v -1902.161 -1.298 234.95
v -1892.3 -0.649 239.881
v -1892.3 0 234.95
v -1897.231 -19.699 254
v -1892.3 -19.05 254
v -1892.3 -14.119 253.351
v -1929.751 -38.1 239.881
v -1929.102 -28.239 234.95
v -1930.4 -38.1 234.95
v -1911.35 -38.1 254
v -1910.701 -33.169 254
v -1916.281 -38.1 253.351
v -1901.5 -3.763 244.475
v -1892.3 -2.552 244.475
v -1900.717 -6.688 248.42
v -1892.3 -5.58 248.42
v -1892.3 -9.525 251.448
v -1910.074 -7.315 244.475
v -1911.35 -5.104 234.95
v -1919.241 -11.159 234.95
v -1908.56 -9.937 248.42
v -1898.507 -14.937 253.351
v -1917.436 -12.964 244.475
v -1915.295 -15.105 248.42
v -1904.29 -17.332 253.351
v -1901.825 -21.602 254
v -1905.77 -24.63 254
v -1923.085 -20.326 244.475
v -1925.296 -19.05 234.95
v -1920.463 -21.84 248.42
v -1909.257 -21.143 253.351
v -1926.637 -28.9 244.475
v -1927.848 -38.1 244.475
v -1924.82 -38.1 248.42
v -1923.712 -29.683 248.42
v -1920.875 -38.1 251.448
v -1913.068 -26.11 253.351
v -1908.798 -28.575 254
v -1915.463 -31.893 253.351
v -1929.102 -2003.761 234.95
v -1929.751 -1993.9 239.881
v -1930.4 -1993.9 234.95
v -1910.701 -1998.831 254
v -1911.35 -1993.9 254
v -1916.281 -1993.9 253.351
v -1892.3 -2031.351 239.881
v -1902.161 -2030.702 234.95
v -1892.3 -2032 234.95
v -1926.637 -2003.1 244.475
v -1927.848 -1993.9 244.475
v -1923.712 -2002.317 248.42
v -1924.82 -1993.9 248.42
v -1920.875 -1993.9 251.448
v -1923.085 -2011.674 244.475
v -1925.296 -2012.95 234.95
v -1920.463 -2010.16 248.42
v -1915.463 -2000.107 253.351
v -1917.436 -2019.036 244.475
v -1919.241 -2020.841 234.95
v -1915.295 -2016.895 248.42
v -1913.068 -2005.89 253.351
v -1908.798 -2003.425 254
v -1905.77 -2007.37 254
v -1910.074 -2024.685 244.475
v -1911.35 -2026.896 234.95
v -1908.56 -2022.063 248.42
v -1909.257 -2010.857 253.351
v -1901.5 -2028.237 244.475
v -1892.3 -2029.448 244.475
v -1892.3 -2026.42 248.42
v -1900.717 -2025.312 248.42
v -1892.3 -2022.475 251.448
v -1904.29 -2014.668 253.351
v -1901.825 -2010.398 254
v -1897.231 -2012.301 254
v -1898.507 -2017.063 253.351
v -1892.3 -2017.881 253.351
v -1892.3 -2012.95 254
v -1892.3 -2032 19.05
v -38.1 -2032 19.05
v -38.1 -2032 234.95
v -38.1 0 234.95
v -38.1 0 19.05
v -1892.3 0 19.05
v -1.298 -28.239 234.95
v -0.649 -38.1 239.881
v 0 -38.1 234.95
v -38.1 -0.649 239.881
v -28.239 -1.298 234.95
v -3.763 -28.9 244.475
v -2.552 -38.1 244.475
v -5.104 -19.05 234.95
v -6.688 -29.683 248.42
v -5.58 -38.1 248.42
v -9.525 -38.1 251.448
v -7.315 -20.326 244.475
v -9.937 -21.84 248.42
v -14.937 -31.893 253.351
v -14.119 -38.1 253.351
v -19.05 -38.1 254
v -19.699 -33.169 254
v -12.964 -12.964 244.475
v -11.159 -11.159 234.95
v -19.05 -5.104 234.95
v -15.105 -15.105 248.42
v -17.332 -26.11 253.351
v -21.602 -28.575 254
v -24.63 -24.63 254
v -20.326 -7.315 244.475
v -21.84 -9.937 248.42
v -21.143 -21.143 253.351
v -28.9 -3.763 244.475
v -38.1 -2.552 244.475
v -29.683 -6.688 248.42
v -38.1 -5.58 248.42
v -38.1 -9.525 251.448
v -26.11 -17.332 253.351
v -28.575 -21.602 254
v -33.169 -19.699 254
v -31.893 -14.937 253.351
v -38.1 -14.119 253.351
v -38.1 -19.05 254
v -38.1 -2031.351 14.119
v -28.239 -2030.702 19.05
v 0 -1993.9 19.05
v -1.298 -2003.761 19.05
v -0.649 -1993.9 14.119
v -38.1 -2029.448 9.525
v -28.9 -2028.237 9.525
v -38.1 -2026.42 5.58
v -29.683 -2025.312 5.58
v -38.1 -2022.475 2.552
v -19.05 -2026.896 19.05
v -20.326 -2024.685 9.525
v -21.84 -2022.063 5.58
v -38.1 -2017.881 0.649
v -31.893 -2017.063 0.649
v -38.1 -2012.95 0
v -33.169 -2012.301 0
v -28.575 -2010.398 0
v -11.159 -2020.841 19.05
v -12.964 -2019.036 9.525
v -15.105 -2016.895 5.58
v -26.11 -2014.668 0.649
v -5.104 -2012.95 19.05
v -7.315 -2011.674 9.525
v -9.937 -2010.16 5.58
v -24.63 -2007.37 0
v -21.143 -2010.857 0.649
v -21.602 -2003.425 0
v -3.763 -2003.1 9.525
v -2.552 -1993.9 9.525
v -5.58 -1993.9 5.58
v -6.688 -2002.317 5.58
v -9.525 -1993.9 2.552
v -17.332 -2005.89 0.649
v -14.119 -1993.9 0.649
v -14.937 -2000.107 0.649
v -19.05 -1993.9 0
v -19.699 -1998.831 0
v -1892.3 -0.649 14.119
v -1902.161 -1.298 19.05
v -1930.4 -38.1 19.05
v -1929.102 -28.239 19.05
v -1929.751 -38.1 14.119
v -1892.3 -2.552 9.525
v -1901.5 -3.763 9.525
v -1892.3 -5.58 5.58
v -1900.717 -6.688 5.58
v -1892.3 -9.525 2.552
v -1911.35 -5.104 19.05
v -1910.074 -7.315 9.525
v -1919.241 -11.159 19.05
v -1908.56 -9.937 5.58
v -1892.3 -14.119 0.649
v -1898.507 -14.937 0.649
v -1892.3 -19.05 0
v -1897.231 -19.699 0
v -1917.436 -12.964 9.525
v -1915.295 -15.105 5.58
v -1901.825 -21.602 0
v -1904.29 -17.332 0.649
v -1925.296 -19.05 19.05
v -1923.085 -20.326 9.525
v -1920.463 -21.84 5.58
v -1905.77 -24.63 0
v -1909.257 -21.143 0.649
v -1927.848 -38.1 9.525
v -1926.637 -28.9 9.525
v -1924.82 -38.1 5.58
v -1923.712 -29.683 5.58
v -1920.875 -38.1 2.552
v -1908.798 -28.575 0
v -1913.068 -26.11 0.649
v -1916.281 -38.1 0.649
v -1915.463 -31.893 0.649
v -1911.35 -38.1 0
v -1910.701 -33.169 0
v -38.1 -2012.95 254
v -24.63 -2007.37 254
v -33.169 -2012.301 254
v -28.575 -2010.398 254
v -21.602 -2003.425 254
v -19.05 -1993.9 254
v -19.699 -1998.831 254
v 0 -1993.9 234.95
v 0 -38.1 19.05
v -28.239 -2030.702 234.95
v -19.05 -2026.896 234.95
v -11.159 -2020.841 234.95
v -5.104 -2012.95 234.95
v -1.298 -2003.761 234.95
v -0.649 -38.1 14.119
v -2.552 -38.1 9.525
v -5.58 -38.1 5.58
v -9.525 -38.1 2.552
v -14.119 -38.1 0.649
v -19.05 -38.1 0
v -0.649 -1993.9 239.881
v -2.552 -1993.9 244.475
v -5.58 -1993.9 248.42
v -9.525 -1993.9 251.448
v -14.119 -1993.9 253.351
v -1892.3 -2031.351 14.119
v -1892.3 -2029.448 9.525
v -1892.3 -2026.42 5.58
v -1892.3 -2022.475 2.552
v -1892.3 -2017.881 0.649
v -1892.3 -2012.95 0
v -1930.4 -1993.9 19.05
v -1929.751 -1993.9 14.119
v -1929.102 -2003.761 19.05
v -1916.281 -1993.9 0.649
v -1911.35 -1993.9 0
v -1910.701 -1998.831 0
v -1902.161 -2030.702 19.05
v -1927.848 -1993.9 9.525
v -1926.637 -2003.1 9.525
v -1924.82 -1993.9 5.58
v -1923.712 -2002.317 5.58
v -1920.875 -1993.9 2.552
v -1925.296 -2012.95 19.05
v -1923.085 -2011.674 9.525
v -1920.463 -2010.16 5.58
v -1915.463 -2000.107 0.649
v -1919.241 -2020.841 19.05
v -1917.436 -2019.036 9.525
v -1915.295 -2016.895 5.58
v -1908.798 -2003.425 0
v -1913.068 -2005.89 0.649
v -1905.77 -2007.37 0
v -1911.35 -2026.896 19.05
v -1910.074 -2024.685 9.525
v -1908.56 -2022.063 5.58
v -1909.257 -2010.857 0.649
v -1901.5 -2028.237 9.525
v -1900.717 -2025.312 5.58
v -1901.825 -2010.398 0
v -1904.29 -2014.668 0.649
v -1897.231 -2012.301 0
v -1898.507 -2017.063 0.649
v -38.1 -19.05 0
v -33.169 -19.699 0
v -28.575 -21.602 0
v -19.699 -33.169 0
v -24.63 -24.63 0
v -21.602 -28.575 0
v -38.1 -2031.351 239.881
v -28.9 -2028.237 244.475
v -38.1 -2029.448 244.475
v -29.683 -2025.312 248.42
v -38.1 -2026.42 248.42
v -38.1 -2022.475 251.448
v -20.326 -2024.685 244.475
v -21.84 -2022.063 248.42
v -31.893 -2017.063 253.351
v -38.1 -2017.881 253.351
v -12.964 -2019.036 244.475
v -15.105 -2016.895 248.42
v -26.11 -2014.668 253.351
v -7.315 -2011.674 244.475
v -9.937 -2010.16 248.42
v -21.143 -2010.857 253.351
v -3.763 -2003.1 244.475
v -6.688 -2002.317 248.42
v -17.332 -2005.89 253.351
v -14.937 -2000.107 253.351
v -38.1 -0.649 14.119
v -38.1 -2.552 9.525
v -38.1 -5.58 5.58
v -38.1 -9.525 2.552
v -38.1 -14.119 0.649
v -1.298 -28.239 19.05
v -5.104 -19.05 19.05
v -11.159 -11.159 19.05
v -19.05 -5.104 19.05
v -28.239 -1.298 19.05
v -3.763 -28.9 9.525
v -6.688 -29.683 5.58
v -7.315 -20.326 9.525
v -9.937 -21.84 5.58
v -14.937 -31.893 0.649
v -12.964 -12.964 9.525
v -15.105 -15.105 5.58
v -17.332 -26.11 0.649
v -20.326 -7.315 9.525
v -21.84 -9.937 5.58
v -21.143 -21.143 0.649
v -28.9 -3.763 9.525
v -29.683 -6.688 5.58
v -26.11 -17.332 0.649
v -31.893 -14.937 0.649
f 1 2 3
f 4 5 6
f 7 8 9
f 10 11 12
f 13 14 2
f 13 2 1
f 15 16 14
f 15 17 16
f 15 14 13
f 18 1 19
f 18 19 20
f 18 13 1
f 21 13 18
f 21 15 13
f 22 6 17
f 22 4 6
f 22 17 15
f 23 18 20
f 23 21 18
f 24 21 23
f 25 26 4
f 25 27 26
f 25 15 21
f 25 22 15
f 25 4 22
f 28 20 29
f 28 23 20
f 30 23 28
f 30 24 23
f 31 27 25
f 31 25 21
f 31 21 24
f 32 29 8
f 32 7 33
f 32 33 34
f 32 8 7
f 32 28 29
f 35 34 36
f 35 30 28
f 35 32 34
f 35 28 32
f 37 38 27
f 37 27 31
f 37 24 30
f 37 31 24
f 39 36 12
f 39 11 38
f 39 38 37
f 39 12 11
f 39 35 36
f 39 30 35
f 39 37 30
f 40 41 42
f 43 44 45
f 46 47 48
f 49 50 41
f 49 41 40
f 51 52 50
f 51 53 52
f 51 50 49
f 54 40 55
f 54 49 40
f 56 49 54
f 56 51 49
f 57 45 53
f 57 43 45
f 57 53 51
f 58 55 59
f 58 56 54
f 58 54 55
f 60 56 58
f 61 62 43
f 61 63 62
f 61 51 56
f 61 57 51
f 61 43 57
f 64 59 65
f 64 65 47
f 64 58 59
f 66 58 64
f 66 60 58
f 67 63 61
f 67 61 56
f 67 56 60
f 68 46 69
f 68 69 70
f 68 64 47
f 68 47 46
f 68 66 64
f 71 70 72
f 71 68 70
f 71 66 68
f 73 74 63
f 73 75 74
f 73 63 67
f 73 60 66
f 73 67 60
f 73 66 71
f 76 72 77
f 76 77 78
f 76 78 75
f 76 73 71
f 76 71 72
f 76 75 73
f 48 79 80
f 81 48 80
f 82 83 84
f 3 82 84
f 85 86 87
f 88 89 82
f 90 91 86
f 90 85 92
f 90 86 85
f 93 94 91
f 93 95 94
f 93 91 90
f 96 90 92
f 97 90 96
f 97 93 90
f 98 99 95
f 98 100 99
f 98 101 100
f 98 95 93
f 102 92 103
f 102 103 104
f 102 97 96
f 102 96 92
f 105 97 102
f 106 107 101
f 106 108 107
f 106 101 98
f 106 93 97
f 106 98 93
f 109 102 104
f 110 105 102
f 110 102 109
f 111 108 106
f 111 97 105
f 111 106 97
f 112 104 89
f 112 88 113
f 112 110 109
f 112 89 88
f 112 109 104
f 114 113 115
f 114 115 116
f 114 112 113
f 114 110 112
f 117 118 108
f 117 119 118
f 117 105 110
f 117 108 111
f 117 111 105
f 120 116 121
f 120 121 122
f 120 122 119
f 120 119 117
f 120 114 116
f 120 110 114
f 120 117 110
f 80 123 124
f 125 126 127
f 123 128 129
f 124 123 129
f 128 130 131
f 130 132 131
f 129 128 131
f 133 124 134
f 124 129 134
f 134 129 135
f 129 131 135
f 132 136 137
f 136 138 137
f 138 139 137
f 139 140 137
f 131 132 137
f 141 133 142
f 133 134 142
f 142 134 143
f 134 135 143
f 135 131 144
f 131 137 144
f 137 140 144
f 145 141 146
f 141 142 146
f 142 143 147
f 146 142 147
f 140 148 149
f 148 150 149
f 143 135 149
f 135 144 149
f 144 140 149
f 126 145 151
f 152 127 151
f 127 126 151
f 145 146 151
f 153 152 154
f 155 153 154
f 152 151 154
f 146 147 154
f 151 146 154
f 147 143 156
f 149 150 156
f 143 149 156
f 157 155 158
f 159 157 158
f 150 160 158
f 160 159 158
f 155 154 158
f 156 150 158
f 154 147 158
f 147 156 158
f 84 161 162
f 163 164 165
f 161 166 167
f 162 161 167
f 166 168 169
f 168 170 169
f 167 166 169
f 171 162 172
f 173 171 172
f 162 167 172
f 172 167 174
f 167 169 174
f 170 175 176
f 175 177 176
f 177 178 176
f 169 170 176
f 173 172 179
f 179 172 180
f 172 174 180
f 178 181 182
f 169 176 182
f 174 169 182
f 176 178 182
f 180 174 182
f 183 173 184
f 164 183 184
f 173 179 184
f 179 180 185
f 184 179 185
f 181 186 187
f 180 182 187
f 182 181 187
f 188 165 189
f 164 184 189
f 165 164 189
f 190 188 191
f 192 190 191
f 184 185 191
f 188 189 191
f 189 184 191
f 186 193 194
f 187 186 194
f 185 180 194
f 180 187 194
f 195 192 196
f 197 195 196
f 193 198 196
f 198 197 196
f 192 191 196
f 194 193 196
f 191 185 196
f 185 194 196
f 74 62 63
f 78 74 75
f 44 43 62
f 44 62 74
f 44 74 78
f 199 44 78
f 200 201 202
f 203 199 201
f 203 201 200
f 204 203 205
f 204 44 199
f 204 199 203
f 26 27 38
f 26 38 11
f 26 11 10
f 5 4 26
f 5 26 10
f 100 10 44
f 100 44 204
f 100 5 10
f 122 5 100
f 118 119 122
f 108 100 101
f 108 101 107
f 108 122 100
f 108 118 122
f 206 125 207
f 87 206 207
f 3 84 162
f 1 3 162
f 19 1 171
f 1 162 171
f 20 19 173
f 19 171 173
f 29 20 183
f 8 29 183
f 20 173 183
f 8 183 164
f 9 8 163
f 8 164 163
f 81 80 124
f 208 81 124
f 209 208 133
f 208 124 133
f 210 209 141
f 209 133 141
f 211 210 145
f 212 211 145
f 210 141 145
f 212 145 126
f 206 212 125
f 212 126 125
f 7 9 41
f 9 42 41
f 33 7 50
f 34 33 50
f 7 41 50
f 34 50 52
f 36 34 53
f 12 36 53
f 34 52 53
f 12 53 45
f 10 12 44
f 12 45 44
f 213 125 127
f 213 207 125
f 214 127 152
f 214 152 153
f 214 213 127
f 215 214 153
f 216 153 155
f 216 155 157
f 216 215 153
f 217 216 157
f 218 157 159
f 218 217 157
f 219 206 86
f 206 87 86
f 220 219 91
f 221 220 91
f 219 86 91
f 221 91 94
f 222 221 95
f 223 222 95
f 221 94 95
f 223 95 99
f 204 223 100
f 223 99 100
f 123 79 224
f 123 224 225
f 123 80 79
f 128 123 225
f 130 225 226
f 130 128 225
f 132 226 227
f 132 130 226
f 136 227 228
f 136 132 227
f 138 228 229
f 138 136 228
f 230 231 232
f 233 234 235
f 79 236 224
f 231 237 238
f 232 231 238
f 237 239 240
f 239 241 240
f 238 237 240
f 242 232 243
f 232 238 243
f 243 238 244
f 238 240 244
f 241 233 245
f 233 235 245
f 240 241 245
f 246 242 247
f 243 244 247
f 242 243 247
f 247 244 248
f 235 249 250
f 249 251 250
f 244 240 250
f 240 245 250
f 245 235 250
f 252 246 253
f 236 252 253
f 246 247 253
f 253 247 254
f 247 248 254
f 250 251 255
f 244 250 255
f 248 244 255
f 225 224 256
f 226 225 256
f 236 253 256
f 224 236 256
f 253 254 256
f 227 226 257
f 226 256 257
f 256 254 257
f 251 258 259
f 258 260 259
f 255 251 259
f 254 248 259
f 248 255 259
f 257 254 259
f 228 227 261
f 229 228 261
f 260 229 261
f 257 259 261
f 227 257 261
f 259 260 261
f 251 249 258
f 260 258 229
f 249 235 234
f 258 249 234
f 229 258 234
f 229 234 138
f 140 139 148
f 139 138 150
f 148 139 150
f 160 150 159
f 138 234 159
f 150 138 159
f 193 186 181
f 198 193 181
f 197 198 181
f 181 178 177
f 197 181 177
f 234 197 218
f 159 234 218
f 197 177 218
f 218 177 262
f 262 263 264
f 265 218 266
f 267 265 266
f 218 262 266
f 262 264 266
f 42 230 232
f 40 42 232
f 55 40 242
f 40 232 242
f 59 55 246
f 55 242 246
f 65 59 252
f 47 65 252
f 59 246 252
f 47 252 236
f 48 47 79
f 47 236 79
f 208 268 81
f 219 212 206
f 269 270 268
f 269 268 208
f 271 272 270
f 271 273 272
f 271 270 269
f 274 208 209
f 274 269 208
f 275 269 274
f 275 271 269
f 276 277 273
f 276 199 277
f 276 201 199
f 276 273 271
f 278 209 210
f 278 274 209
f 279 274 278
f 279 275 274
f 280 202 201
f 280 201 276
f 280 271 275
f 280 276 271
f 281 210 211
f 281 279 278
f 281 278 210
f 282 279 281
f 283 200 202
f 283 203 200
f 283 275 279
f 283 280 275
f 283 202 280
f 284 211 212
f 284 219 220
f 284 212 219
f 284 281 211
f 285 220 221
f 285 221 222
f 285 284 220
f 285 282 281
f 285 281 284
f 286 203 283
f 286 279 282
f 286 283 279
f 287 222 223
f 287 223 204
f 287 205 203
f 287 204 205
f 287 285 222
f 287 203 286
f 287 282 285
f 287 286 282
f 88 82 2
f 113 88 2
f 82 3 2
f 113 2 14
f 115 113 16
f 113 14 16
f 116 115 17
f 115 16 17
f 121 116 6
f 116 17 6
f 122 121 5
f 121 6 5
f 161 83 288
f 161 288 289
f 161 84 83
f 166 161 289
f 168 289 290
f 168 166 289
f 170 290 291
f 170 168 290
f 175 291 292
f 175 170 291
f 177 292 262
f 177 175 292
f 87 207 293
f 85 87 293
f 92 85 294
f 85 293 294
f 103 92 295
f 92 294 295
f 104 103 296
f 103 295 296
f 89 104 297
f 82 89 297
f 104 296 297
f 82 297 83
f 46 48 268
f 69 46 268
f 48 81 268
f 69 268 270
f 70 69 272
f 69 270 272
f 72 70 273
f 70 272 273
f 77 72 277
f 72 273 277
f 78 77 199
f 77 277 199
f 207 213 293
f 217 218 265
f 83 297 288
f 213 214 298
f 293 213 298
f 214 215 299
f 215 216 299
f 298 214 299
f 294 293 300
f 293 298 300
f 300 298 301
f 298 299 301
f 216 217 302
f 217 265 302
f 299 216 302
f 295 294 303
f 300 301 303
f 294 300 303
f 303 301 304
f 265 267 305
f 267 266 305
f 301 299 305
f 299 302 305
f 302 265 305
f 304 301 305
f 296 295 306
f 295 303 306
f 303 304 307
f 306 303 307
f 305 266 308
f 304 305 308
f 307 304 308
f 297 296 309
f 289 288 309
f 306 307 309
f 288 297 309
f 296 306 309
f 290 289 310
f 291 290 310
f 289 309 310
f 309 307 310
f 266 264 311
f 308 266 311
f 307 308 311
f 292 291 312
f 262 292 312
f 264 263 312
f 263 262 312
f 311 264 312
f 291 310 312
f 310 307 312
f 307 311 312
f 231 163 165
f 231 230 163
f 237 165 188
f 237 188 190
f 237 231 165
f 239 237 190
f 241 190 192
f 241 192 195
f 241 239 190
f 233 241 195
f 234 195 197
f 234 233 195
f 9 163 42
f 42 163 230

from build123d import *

# Parameters (mm, degrees)
F2_DEPTH = 254
F3_R     = 19.05
F4_R     = 19.05


with BuildPart() as f2:
    # F1 (on Top) → F2 (new body)
    with BuildSketch(Plane.XY):
        with BuildLine():
            ThreePointArc((0, -38.1), (-11.1592316368, -11.1592316368), (-38.1, 0))
            Line((-38.1, 0), (-1892.3, 0))
            ThreePointArc((-1892.3, 0), (-1919.2407683632, -11.1592316368), (-1930.4, -38.1))
            Line((-1930.4, -38.1), (-1930.4, -1993.9))
            ThreePointArc((-1930.4, -1993.9), (-1919.2407683632, -2020.8407683632), (-1892.3, -2032))
            Line((-1892.3, -2032), (-38.1, -2032))
            ThreePointArc((-38.1, -2032), (-11.1592316368, -2020.8407683632), (0, -1993.9))
            Line((0, -1993.9), (0, -38.1))
        make_face()
    extrude(amount=F2_DEPTH)

    # F3
    f3_edges = [f2.edges().sort_by_distance(p)[0] for p in [
        (0, -1016, 254),
        (-11.159232, -11.159232, 254),
        (-965.2, 0, 254),
        (-1919.240768, -11.159232, 254),
        (-1930.4, -1016, 254),
        (-1919.240768, -2020.840768, 254),
        (-965.2, -2032, 254),
        (-11.159232, -2020.840768, 254),
    ]]
    fillet(f3_edges, radius=F3_R)

    # F4
    f4_edges = [f2.edges().sort_by_distance(p)[0] for p in [
        (0, -1016, 0),
        (-11.159232, -11.159232, 0),
        (-965.2, 0, 0),
        (-1919.240768, -11.159232, 0),
        (-1930.4, -1016, 0),
        (-1919.240768, -2020.840768, 0),
        (-965.2, -2032, 0),
        (-11.159232, -2020.840768, 0),
    ]]
    fillet(f4_edges, radius=F4_R)


solid = f2.part
